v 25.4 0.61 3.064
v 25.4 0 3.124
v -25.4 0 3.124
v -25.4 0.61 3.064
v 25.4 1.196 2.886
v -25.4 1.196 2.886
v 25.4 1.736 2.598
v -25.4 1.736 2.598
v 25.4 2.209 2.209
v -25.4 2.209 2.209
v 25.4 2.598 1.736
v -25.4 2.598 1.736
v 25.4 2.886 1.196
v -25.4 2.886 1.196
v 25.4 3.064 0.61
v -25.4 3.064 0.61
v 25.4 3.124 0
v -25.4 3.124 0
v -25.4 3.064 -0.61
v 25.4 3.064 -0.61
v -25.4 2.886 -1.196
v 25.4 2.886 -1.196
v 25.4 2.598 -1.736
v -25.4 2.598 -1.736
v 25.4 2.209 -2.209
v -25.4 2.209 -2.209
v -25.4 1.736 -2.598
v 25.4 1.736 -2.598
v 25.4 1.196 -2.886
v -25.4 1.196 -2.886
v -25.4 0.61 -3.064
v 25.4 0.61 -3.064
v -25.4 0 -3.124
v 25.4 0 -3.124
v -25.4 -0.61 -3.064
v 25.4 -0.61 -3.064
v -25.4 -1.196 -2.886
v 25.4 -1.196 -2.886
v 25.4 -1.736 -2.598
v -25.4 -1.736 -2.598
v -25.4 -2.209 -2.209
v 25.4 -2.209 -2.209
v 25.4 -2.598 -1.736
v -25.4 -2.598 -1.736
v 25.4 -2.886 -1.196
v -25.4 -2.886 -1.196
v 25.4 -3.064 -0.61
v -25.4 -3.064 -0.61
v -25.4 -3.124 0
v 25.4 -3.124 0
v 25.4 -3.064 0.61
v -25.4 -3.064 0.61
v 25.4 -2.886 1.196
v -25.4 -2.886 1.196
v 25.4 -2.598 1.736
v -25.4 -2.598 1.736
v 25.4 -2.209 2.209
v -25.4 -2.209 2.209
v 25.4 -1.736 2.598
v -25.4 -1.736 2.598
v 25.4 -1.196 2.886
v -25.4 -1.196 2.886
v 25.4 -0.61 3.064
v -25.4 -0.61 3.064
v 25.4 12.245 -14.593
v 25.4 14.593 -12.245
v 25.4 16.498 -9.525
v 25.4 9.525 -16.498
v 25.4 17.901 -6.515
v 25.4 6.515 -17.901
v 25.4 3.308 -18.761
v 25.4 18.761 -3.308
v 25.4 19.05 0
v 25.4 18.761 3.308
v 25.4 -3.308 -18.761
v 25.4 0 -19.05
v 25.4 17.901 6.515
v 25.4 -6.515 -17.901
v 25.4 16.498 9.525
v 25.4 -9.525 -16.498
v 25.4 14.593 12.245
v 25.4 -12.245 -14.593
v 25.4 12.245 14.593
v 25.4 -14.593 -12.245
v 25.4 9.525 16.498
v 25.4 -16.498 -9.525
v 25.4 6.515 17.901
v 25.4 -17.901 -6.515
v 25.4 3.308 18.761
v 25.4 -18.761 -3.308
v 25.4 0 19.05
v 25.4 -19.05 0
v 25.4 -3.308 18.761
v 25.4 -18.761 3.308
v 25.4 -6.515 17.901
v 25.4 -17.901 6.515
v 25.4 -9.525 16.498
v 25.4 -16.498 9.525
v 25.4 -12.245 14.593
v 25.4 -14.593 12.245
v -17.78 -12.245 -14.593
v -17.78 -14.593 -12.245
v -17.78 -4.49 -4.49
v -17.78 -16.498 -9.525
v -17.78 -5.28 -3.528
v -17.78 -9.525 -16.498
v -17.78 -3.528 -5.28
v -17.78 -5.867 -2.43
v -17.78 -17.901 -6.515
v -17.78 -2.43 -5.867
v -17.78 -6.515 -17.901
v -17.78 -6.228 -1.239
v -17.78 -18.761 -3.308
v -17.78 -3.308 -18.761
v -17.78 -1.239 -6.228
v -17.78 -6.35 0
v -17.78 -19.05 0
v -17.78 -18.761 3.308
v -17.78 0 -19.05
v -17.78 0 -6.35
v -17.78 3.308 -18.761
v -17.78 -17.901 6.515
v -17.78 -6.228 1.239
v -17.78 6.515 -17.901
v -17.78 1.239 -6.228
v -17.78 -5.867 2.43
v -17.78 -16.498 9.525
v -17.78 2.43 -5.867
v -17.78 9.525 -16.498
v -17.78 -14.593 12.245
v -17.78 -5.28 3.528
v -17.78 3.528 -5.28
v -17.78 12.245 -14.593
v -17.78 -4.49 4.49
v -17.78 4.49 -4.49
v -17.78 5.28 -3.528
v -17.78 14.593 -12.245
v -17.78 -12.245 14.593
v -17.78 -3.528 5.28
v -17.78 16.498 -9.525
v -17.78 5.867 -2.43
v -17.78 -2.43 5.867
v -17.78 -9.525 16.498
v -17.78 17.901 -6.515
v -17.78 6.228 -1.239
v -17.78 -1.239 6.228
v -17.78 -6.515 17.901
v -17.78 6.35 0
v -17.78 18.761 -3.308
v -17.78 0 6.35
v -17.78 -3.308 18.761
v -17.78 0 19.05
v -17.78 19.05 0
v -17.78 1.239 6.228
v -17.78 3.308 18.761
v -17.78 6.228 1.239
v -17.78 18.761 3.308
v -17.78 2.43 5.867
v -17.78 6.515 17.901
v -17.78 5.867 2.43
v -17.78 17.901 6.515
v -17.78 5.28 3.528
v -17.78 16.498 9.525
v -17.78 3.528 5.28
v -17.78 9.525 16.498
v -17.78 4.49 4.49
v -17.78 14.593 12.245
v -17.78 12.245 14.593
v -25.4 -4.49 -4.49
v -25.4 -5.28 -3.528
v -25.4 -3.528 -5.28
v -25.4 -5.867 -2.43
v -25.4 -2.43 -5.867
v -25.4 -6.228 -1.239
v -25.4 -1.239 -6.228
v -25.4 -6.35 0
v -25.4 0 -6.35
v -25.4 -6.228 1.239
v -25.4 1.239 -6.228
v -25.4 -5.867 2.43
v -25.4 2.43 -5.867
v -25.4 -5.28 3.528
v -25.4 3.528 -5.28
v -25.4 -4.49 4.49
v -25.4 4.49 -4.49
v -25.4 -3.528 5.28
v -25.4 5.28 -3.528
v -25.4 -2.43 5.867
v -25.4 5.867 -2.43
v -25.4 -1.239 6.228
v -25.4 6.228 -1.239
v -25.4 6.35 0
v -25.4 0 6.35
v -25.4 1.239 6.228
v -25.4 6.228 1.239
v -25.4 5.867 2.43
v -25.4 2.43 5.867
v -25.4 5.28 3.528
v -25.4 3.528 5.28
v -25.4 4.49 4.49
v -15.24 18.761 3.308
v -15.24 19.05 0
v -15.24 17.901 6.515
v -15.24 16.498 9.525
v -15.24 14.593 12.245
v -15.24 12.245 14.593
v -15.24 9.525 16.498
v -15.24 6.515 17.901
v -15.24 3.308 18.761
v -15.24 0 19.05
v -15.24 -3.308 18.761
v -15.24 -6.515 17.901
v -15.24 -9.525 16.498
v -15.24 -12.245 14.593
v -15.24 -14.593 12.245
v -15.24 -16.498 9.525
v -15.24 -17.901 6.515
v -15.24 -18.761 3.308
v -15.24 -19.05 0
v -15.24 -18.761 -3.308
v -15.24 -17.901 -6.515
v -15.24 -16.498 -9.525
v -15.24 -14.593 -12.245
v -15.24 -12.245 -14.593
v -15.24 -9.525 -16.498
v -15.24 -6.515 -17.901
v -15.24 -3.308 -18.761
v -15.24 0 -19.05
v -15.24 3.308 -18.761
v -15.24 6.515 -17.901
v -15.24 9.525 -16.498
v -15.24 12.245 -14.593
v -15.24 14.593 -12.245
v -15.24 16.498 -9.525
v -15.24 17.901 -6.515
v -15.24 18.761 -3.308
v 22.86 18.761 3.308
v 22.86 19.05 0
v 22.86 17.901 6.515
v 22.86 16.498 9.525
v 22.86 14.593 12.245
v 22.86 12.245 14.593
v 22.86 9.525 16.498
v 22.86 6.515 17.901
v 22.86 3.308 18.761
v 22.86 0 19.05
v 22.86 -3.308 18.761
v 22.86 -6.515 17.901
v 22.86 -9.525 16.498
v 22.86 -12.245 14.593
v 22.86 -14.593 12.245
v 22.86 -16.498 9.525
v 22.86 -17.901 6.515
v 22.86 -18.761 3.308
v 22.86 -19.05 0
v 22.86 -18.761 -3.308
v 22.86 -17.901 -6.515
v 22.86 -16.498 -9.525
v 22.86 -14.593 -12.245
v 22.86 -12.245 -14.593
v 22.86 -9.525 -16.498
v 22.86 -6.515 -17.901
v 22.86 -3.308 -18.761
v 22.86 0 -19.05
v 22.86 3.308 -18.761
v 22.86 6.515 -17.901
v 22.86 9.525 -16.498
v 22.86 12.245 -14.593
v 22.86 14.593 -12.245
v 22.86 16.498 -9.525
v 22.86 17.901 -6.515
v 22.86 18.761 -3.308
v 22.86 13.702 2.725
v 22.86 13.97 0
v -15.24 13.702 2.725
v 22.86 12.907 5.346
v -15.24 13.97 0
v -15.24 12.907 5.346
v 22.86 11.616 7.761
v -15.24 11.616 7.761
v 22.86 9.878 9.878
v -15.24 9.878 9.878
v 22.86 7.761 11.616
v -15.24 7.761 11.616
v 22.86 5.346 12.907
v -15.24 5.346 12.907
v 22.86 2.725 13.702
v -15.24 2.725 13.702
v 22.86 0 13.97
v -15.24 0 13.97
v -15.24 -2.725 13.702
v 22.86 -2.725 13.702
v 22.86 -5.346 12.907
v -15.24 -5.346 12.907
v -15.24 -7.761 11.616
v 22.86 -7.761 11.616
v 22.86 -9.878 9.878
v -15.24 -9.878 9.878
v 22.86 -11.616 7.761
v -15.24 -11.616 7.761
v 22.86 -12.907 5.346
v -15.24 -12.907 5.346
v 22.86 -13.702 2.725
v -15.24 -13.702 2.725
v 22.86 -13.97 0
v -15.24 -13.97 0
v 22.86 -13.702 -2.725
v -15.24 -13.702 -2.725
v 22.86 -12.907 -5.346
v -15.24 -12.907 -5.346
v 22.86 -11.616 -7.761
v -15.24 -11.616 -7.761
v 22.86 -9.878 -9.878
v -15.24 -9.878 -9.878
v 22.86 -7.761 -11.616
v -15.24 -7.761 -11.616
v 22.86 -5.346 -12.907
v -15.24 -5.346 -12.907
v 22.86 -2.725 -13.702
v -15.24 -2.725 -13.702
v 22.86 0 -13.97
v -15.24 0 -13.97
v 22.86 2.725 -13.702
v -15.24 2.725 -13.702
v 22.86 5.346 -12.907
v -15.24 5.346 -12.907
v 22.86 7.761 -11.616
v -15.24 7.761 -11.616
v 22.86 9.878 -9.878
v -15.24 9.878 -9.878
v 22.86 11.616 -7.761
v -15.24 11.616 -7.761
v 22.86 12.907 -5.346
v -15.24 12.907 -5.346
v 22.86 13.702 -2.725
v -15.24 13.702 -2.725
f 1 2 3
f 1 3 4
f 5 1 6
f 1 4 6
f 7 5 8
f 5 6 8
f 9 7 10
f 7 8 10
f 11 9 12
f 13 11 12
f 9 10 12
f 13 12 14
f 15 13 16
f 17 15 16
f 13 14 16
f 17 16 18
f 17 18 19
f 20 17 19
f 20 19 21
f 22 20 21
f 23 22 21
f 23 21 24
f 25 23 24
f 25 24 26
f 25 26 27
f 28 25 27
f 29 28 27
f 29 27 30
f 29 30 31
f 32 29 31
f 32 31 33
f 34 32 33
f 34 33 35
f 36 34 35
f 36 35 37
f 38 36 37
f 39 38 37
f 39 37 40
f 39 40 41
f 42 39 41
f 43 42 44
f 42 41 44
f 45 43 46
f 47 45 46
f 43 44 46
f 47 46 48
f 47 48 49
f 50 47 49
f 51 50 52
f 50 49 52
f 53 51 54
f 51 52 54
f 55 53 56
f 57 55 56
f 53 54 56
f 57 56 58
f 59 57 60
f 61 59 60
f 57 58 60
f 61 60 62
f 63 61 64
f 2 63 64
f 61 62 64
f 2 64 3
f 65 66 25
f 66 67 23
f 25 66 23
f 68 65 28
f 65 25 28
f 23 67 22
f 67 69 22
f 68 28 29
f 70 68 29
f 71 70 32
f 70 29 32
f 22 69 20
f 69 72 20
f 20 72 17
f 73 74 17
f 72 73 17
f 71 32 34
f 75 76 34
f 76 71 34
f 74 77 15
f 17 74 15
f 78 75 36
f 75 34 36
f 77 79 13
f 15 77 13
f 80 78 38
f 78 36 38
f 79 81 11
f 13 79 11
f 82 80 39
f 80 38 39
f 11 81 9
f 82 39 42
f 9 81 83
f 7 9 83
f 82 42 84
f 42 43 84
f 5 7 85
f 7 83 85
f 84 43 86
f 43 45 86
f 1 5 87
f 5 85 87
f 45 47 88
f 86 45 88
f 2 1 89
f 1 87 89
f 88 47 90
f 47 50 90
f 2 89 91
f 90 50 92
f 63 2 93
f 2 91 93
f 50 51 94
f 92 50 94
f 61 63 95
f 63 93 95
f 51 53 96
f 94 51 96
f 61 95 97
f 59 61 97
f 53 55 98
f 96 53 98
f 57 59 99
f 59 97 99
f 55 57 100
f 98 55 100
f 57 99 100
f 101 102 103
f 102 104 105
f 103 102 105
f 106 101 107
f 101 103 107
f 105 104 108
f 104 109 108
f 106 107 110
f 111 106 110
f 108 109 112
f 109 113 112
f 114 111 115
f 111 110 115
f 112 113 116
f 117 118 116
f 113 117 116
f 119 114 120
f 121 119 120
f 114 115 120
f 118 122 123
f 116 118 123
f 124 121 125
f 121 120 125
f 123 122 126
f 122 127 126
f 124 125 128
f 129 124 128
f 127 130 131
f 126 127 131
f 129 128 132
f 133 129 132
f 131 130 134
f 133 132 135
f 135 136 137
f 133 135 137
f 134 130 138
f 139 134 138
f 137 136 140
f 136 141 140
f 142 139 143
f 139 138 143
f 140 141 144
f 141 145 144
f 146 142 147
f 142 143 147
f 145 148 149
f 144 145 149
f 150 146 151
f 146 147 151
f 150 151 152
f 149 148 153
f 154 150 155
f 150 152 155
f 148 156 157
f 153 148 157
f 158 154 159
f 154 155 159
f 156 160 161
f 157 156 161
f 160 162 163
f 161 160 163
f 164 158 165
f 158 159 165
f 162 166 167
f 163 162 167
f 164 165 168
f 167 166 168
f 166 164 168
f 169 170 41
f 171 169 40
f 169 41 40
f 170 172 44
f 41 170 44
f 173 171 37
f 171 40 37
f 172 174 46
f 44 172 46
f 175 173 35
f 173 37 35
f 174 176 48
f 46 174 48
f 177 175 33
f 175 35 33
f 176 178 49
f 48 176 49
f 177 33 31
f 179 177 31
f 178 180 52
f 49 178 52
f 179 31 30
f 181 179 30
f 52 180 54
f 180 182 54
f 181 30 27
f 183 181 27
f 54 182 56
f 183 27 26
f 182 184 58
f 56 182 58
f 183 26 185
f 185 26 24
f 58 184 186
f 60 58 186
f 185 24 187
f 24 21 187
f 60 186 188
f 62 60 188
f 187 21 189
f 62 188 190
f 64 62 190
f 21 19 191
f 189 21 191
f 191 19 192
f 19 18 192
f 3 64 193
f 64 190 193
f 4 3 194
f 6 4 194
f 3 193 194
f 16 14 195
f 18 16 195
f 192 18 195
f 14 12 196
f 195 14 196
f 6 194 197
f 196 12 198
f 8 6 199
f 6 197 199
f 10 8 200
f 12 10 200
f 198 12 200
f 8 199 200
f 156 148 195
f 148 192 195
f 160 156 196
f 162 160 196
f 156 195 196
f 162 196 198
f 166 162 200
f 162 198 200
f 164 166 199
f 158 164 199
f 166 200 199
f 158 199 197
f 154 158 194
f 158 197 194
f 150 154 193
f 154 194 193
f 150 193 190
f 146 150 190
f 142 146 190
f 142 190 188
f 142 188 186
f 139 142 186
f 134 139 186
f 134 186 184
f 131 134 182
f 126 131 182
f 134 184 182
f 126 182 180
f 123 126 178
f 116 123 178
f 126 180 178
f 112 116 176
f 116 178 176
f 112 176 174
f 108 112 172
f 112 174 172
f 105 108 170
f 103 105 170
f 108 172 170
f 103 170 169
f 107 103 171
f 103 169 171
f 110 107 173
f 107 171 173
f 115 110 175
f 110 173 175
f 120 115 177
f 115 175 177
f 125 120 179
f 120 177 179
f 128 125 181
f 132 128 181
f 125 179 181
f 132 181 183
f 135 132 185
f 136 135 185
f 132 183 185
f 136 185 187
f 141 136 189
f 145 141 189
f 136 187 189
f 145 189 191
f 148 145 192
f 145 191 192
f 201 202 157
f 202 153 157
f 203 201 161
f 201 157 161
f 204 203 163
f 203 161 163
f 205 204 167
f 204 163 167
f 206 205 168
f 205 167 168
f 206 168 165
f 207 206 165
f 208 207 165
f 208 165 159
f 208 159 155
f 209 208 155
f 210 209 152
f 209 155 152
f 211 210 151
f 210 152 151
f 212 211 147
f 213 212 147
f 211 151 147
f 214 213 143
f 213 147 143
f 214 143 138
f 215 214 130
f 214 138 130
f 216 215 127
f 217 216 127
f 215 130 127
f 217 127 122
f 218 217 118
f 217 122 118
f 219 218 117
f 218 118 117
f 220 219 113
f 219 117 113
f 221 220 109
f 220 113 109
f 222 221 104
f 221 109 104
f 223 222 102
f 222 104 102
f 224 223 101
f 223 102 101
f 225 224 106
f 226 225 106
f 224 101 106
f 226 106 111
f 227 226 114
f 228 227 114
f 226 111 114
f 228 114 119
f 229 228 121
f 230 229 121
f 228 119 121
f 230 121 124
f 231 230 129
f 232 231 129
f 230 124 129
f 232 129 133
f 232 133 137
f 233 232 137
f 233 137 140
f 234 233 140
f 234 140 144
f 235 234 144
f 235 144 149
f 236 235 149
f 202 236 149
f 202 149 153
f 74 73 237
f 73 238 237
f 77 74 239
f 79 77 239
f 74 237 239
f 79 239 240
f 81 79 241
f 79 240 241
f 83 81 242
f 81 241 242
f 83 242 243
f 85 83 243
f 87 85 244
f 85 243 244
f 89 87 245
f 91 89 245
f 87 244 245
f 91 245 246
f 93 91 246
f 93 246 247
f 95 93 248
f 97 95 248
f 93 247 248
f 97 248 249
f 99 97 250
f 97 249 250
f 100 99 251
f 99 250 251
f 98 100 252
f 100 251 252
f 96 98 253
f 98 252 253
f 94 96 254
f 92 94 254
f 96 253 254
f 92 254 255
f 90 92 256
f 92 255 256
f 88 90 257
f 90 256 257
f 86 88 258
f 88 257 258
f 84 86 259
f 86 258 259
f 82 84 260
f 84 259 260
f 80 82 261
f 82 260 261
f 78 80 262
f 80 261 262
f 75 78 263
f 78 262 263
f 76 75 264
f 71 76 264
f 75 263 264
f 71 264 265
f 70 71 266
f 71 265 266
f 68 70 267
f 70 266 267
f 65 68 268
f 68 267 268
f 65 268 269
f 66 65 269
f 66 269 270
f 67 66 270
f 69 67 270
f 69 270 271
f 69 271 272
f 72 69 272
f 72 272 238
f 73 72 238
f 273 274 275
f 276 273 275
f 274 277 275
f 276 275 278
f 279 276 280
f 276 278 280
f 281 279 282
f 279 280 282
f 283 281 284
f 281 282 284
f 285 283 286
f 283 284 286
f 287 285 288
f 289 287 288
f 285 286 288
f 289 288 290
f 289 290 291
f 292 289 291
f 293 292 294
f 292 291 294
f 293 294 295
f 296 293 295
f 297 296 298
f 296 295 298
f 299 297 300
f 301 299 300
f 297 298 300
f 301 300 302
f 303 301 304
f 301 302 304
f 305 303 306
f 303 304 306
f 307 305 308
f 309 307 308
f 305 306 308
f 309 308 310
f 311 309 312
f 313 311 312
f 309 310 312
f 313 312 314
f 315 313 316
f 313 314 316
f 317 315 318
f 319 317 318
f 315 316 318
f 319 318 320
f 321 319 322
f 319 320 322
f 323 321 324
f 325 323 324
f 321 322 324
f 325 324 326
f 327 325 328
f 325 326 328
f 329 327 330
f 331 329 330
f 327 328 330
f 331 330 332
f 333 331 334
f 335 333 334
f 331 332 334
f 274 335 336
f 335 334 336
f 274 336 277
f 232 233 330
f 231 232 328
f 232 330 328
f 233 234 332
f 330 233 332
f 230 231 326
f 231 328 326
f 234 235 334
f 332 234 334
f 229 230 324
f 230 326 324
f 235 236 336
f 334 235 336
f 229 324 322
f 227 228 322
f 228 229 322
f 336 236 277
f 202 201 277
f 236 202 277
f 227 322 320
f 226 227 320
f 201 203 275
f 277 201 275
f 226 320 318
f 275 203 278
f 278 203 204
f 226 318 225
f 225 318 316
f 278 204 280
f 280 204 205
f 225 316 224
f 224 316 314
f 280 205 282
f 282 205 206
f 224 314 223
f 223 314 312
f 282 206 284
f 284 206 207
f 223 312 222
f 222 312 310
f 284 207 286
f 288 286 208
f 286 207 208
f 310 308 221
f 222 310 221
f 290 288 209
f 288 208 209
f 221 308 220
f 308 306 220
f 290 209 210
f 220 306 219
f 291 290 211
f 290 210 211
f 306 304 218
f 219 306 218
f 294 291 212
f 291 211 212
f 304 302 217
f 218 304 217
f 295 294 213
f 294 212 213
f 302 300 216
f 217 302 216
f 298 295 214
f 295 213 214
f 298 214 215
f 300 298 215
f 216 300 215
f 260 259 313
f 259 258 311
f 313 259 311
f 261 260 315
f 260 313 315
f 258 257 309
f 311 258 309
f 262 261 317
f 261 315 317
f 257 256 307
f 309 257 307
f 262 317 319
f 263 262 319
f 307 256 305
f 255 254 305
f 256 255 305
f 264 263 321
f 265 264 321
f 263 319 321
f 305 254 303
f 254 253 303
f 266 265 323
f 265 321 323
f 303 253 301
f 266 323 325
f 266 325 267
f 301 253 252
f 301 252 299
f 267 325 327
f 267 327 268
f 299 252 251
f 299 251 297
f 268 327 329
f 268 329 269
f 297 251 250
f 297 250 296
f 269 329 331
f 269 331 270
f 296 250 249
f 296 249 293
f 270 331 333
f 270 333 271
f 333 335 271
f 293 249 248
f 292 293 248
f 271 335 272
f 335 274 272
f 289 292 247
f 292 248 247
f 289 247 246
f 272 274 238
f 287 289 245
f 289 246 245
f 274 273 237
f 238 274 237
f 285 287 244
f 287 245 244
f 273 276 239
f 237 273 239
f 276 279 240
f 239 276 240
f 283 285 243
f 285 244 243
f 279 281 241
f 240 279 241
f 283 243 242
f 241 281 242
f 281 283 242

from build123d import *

# Parameters (mm, degrees)
SKETCH2_R          = 3.1242
CUT_EXTRUDE1_DEPTH = 51.8


with BuildPart() as part:
    # Sketch1 → Revolve1 (revolve)
    with BuildSketch(Plane.XY):
        Polygon((-25.4, 0), (25.4, 0), (25.4, 19.05), (22.86, 19.05), (22.86, 13.97), (-15.24, 13.97), (-15.24, 19.05), (-17.78, 19.05), (-17.78, 6.35), (-25.4, 6.35), align=None)
    revolve(axis=Axis((-25.4, 0, 0), (1, 0, 0)))

    # Sketch2 → Cut-Extrude1 (cut, through all)
    with BuildSketch(Plane.ZY.offset(25.4)):
        Circle(SKETCH2_R)
    extrude(amount=-CUT_EXTRUDE1_DEPTH, mode=Mode.SUBTRACT)


solid = part.part
